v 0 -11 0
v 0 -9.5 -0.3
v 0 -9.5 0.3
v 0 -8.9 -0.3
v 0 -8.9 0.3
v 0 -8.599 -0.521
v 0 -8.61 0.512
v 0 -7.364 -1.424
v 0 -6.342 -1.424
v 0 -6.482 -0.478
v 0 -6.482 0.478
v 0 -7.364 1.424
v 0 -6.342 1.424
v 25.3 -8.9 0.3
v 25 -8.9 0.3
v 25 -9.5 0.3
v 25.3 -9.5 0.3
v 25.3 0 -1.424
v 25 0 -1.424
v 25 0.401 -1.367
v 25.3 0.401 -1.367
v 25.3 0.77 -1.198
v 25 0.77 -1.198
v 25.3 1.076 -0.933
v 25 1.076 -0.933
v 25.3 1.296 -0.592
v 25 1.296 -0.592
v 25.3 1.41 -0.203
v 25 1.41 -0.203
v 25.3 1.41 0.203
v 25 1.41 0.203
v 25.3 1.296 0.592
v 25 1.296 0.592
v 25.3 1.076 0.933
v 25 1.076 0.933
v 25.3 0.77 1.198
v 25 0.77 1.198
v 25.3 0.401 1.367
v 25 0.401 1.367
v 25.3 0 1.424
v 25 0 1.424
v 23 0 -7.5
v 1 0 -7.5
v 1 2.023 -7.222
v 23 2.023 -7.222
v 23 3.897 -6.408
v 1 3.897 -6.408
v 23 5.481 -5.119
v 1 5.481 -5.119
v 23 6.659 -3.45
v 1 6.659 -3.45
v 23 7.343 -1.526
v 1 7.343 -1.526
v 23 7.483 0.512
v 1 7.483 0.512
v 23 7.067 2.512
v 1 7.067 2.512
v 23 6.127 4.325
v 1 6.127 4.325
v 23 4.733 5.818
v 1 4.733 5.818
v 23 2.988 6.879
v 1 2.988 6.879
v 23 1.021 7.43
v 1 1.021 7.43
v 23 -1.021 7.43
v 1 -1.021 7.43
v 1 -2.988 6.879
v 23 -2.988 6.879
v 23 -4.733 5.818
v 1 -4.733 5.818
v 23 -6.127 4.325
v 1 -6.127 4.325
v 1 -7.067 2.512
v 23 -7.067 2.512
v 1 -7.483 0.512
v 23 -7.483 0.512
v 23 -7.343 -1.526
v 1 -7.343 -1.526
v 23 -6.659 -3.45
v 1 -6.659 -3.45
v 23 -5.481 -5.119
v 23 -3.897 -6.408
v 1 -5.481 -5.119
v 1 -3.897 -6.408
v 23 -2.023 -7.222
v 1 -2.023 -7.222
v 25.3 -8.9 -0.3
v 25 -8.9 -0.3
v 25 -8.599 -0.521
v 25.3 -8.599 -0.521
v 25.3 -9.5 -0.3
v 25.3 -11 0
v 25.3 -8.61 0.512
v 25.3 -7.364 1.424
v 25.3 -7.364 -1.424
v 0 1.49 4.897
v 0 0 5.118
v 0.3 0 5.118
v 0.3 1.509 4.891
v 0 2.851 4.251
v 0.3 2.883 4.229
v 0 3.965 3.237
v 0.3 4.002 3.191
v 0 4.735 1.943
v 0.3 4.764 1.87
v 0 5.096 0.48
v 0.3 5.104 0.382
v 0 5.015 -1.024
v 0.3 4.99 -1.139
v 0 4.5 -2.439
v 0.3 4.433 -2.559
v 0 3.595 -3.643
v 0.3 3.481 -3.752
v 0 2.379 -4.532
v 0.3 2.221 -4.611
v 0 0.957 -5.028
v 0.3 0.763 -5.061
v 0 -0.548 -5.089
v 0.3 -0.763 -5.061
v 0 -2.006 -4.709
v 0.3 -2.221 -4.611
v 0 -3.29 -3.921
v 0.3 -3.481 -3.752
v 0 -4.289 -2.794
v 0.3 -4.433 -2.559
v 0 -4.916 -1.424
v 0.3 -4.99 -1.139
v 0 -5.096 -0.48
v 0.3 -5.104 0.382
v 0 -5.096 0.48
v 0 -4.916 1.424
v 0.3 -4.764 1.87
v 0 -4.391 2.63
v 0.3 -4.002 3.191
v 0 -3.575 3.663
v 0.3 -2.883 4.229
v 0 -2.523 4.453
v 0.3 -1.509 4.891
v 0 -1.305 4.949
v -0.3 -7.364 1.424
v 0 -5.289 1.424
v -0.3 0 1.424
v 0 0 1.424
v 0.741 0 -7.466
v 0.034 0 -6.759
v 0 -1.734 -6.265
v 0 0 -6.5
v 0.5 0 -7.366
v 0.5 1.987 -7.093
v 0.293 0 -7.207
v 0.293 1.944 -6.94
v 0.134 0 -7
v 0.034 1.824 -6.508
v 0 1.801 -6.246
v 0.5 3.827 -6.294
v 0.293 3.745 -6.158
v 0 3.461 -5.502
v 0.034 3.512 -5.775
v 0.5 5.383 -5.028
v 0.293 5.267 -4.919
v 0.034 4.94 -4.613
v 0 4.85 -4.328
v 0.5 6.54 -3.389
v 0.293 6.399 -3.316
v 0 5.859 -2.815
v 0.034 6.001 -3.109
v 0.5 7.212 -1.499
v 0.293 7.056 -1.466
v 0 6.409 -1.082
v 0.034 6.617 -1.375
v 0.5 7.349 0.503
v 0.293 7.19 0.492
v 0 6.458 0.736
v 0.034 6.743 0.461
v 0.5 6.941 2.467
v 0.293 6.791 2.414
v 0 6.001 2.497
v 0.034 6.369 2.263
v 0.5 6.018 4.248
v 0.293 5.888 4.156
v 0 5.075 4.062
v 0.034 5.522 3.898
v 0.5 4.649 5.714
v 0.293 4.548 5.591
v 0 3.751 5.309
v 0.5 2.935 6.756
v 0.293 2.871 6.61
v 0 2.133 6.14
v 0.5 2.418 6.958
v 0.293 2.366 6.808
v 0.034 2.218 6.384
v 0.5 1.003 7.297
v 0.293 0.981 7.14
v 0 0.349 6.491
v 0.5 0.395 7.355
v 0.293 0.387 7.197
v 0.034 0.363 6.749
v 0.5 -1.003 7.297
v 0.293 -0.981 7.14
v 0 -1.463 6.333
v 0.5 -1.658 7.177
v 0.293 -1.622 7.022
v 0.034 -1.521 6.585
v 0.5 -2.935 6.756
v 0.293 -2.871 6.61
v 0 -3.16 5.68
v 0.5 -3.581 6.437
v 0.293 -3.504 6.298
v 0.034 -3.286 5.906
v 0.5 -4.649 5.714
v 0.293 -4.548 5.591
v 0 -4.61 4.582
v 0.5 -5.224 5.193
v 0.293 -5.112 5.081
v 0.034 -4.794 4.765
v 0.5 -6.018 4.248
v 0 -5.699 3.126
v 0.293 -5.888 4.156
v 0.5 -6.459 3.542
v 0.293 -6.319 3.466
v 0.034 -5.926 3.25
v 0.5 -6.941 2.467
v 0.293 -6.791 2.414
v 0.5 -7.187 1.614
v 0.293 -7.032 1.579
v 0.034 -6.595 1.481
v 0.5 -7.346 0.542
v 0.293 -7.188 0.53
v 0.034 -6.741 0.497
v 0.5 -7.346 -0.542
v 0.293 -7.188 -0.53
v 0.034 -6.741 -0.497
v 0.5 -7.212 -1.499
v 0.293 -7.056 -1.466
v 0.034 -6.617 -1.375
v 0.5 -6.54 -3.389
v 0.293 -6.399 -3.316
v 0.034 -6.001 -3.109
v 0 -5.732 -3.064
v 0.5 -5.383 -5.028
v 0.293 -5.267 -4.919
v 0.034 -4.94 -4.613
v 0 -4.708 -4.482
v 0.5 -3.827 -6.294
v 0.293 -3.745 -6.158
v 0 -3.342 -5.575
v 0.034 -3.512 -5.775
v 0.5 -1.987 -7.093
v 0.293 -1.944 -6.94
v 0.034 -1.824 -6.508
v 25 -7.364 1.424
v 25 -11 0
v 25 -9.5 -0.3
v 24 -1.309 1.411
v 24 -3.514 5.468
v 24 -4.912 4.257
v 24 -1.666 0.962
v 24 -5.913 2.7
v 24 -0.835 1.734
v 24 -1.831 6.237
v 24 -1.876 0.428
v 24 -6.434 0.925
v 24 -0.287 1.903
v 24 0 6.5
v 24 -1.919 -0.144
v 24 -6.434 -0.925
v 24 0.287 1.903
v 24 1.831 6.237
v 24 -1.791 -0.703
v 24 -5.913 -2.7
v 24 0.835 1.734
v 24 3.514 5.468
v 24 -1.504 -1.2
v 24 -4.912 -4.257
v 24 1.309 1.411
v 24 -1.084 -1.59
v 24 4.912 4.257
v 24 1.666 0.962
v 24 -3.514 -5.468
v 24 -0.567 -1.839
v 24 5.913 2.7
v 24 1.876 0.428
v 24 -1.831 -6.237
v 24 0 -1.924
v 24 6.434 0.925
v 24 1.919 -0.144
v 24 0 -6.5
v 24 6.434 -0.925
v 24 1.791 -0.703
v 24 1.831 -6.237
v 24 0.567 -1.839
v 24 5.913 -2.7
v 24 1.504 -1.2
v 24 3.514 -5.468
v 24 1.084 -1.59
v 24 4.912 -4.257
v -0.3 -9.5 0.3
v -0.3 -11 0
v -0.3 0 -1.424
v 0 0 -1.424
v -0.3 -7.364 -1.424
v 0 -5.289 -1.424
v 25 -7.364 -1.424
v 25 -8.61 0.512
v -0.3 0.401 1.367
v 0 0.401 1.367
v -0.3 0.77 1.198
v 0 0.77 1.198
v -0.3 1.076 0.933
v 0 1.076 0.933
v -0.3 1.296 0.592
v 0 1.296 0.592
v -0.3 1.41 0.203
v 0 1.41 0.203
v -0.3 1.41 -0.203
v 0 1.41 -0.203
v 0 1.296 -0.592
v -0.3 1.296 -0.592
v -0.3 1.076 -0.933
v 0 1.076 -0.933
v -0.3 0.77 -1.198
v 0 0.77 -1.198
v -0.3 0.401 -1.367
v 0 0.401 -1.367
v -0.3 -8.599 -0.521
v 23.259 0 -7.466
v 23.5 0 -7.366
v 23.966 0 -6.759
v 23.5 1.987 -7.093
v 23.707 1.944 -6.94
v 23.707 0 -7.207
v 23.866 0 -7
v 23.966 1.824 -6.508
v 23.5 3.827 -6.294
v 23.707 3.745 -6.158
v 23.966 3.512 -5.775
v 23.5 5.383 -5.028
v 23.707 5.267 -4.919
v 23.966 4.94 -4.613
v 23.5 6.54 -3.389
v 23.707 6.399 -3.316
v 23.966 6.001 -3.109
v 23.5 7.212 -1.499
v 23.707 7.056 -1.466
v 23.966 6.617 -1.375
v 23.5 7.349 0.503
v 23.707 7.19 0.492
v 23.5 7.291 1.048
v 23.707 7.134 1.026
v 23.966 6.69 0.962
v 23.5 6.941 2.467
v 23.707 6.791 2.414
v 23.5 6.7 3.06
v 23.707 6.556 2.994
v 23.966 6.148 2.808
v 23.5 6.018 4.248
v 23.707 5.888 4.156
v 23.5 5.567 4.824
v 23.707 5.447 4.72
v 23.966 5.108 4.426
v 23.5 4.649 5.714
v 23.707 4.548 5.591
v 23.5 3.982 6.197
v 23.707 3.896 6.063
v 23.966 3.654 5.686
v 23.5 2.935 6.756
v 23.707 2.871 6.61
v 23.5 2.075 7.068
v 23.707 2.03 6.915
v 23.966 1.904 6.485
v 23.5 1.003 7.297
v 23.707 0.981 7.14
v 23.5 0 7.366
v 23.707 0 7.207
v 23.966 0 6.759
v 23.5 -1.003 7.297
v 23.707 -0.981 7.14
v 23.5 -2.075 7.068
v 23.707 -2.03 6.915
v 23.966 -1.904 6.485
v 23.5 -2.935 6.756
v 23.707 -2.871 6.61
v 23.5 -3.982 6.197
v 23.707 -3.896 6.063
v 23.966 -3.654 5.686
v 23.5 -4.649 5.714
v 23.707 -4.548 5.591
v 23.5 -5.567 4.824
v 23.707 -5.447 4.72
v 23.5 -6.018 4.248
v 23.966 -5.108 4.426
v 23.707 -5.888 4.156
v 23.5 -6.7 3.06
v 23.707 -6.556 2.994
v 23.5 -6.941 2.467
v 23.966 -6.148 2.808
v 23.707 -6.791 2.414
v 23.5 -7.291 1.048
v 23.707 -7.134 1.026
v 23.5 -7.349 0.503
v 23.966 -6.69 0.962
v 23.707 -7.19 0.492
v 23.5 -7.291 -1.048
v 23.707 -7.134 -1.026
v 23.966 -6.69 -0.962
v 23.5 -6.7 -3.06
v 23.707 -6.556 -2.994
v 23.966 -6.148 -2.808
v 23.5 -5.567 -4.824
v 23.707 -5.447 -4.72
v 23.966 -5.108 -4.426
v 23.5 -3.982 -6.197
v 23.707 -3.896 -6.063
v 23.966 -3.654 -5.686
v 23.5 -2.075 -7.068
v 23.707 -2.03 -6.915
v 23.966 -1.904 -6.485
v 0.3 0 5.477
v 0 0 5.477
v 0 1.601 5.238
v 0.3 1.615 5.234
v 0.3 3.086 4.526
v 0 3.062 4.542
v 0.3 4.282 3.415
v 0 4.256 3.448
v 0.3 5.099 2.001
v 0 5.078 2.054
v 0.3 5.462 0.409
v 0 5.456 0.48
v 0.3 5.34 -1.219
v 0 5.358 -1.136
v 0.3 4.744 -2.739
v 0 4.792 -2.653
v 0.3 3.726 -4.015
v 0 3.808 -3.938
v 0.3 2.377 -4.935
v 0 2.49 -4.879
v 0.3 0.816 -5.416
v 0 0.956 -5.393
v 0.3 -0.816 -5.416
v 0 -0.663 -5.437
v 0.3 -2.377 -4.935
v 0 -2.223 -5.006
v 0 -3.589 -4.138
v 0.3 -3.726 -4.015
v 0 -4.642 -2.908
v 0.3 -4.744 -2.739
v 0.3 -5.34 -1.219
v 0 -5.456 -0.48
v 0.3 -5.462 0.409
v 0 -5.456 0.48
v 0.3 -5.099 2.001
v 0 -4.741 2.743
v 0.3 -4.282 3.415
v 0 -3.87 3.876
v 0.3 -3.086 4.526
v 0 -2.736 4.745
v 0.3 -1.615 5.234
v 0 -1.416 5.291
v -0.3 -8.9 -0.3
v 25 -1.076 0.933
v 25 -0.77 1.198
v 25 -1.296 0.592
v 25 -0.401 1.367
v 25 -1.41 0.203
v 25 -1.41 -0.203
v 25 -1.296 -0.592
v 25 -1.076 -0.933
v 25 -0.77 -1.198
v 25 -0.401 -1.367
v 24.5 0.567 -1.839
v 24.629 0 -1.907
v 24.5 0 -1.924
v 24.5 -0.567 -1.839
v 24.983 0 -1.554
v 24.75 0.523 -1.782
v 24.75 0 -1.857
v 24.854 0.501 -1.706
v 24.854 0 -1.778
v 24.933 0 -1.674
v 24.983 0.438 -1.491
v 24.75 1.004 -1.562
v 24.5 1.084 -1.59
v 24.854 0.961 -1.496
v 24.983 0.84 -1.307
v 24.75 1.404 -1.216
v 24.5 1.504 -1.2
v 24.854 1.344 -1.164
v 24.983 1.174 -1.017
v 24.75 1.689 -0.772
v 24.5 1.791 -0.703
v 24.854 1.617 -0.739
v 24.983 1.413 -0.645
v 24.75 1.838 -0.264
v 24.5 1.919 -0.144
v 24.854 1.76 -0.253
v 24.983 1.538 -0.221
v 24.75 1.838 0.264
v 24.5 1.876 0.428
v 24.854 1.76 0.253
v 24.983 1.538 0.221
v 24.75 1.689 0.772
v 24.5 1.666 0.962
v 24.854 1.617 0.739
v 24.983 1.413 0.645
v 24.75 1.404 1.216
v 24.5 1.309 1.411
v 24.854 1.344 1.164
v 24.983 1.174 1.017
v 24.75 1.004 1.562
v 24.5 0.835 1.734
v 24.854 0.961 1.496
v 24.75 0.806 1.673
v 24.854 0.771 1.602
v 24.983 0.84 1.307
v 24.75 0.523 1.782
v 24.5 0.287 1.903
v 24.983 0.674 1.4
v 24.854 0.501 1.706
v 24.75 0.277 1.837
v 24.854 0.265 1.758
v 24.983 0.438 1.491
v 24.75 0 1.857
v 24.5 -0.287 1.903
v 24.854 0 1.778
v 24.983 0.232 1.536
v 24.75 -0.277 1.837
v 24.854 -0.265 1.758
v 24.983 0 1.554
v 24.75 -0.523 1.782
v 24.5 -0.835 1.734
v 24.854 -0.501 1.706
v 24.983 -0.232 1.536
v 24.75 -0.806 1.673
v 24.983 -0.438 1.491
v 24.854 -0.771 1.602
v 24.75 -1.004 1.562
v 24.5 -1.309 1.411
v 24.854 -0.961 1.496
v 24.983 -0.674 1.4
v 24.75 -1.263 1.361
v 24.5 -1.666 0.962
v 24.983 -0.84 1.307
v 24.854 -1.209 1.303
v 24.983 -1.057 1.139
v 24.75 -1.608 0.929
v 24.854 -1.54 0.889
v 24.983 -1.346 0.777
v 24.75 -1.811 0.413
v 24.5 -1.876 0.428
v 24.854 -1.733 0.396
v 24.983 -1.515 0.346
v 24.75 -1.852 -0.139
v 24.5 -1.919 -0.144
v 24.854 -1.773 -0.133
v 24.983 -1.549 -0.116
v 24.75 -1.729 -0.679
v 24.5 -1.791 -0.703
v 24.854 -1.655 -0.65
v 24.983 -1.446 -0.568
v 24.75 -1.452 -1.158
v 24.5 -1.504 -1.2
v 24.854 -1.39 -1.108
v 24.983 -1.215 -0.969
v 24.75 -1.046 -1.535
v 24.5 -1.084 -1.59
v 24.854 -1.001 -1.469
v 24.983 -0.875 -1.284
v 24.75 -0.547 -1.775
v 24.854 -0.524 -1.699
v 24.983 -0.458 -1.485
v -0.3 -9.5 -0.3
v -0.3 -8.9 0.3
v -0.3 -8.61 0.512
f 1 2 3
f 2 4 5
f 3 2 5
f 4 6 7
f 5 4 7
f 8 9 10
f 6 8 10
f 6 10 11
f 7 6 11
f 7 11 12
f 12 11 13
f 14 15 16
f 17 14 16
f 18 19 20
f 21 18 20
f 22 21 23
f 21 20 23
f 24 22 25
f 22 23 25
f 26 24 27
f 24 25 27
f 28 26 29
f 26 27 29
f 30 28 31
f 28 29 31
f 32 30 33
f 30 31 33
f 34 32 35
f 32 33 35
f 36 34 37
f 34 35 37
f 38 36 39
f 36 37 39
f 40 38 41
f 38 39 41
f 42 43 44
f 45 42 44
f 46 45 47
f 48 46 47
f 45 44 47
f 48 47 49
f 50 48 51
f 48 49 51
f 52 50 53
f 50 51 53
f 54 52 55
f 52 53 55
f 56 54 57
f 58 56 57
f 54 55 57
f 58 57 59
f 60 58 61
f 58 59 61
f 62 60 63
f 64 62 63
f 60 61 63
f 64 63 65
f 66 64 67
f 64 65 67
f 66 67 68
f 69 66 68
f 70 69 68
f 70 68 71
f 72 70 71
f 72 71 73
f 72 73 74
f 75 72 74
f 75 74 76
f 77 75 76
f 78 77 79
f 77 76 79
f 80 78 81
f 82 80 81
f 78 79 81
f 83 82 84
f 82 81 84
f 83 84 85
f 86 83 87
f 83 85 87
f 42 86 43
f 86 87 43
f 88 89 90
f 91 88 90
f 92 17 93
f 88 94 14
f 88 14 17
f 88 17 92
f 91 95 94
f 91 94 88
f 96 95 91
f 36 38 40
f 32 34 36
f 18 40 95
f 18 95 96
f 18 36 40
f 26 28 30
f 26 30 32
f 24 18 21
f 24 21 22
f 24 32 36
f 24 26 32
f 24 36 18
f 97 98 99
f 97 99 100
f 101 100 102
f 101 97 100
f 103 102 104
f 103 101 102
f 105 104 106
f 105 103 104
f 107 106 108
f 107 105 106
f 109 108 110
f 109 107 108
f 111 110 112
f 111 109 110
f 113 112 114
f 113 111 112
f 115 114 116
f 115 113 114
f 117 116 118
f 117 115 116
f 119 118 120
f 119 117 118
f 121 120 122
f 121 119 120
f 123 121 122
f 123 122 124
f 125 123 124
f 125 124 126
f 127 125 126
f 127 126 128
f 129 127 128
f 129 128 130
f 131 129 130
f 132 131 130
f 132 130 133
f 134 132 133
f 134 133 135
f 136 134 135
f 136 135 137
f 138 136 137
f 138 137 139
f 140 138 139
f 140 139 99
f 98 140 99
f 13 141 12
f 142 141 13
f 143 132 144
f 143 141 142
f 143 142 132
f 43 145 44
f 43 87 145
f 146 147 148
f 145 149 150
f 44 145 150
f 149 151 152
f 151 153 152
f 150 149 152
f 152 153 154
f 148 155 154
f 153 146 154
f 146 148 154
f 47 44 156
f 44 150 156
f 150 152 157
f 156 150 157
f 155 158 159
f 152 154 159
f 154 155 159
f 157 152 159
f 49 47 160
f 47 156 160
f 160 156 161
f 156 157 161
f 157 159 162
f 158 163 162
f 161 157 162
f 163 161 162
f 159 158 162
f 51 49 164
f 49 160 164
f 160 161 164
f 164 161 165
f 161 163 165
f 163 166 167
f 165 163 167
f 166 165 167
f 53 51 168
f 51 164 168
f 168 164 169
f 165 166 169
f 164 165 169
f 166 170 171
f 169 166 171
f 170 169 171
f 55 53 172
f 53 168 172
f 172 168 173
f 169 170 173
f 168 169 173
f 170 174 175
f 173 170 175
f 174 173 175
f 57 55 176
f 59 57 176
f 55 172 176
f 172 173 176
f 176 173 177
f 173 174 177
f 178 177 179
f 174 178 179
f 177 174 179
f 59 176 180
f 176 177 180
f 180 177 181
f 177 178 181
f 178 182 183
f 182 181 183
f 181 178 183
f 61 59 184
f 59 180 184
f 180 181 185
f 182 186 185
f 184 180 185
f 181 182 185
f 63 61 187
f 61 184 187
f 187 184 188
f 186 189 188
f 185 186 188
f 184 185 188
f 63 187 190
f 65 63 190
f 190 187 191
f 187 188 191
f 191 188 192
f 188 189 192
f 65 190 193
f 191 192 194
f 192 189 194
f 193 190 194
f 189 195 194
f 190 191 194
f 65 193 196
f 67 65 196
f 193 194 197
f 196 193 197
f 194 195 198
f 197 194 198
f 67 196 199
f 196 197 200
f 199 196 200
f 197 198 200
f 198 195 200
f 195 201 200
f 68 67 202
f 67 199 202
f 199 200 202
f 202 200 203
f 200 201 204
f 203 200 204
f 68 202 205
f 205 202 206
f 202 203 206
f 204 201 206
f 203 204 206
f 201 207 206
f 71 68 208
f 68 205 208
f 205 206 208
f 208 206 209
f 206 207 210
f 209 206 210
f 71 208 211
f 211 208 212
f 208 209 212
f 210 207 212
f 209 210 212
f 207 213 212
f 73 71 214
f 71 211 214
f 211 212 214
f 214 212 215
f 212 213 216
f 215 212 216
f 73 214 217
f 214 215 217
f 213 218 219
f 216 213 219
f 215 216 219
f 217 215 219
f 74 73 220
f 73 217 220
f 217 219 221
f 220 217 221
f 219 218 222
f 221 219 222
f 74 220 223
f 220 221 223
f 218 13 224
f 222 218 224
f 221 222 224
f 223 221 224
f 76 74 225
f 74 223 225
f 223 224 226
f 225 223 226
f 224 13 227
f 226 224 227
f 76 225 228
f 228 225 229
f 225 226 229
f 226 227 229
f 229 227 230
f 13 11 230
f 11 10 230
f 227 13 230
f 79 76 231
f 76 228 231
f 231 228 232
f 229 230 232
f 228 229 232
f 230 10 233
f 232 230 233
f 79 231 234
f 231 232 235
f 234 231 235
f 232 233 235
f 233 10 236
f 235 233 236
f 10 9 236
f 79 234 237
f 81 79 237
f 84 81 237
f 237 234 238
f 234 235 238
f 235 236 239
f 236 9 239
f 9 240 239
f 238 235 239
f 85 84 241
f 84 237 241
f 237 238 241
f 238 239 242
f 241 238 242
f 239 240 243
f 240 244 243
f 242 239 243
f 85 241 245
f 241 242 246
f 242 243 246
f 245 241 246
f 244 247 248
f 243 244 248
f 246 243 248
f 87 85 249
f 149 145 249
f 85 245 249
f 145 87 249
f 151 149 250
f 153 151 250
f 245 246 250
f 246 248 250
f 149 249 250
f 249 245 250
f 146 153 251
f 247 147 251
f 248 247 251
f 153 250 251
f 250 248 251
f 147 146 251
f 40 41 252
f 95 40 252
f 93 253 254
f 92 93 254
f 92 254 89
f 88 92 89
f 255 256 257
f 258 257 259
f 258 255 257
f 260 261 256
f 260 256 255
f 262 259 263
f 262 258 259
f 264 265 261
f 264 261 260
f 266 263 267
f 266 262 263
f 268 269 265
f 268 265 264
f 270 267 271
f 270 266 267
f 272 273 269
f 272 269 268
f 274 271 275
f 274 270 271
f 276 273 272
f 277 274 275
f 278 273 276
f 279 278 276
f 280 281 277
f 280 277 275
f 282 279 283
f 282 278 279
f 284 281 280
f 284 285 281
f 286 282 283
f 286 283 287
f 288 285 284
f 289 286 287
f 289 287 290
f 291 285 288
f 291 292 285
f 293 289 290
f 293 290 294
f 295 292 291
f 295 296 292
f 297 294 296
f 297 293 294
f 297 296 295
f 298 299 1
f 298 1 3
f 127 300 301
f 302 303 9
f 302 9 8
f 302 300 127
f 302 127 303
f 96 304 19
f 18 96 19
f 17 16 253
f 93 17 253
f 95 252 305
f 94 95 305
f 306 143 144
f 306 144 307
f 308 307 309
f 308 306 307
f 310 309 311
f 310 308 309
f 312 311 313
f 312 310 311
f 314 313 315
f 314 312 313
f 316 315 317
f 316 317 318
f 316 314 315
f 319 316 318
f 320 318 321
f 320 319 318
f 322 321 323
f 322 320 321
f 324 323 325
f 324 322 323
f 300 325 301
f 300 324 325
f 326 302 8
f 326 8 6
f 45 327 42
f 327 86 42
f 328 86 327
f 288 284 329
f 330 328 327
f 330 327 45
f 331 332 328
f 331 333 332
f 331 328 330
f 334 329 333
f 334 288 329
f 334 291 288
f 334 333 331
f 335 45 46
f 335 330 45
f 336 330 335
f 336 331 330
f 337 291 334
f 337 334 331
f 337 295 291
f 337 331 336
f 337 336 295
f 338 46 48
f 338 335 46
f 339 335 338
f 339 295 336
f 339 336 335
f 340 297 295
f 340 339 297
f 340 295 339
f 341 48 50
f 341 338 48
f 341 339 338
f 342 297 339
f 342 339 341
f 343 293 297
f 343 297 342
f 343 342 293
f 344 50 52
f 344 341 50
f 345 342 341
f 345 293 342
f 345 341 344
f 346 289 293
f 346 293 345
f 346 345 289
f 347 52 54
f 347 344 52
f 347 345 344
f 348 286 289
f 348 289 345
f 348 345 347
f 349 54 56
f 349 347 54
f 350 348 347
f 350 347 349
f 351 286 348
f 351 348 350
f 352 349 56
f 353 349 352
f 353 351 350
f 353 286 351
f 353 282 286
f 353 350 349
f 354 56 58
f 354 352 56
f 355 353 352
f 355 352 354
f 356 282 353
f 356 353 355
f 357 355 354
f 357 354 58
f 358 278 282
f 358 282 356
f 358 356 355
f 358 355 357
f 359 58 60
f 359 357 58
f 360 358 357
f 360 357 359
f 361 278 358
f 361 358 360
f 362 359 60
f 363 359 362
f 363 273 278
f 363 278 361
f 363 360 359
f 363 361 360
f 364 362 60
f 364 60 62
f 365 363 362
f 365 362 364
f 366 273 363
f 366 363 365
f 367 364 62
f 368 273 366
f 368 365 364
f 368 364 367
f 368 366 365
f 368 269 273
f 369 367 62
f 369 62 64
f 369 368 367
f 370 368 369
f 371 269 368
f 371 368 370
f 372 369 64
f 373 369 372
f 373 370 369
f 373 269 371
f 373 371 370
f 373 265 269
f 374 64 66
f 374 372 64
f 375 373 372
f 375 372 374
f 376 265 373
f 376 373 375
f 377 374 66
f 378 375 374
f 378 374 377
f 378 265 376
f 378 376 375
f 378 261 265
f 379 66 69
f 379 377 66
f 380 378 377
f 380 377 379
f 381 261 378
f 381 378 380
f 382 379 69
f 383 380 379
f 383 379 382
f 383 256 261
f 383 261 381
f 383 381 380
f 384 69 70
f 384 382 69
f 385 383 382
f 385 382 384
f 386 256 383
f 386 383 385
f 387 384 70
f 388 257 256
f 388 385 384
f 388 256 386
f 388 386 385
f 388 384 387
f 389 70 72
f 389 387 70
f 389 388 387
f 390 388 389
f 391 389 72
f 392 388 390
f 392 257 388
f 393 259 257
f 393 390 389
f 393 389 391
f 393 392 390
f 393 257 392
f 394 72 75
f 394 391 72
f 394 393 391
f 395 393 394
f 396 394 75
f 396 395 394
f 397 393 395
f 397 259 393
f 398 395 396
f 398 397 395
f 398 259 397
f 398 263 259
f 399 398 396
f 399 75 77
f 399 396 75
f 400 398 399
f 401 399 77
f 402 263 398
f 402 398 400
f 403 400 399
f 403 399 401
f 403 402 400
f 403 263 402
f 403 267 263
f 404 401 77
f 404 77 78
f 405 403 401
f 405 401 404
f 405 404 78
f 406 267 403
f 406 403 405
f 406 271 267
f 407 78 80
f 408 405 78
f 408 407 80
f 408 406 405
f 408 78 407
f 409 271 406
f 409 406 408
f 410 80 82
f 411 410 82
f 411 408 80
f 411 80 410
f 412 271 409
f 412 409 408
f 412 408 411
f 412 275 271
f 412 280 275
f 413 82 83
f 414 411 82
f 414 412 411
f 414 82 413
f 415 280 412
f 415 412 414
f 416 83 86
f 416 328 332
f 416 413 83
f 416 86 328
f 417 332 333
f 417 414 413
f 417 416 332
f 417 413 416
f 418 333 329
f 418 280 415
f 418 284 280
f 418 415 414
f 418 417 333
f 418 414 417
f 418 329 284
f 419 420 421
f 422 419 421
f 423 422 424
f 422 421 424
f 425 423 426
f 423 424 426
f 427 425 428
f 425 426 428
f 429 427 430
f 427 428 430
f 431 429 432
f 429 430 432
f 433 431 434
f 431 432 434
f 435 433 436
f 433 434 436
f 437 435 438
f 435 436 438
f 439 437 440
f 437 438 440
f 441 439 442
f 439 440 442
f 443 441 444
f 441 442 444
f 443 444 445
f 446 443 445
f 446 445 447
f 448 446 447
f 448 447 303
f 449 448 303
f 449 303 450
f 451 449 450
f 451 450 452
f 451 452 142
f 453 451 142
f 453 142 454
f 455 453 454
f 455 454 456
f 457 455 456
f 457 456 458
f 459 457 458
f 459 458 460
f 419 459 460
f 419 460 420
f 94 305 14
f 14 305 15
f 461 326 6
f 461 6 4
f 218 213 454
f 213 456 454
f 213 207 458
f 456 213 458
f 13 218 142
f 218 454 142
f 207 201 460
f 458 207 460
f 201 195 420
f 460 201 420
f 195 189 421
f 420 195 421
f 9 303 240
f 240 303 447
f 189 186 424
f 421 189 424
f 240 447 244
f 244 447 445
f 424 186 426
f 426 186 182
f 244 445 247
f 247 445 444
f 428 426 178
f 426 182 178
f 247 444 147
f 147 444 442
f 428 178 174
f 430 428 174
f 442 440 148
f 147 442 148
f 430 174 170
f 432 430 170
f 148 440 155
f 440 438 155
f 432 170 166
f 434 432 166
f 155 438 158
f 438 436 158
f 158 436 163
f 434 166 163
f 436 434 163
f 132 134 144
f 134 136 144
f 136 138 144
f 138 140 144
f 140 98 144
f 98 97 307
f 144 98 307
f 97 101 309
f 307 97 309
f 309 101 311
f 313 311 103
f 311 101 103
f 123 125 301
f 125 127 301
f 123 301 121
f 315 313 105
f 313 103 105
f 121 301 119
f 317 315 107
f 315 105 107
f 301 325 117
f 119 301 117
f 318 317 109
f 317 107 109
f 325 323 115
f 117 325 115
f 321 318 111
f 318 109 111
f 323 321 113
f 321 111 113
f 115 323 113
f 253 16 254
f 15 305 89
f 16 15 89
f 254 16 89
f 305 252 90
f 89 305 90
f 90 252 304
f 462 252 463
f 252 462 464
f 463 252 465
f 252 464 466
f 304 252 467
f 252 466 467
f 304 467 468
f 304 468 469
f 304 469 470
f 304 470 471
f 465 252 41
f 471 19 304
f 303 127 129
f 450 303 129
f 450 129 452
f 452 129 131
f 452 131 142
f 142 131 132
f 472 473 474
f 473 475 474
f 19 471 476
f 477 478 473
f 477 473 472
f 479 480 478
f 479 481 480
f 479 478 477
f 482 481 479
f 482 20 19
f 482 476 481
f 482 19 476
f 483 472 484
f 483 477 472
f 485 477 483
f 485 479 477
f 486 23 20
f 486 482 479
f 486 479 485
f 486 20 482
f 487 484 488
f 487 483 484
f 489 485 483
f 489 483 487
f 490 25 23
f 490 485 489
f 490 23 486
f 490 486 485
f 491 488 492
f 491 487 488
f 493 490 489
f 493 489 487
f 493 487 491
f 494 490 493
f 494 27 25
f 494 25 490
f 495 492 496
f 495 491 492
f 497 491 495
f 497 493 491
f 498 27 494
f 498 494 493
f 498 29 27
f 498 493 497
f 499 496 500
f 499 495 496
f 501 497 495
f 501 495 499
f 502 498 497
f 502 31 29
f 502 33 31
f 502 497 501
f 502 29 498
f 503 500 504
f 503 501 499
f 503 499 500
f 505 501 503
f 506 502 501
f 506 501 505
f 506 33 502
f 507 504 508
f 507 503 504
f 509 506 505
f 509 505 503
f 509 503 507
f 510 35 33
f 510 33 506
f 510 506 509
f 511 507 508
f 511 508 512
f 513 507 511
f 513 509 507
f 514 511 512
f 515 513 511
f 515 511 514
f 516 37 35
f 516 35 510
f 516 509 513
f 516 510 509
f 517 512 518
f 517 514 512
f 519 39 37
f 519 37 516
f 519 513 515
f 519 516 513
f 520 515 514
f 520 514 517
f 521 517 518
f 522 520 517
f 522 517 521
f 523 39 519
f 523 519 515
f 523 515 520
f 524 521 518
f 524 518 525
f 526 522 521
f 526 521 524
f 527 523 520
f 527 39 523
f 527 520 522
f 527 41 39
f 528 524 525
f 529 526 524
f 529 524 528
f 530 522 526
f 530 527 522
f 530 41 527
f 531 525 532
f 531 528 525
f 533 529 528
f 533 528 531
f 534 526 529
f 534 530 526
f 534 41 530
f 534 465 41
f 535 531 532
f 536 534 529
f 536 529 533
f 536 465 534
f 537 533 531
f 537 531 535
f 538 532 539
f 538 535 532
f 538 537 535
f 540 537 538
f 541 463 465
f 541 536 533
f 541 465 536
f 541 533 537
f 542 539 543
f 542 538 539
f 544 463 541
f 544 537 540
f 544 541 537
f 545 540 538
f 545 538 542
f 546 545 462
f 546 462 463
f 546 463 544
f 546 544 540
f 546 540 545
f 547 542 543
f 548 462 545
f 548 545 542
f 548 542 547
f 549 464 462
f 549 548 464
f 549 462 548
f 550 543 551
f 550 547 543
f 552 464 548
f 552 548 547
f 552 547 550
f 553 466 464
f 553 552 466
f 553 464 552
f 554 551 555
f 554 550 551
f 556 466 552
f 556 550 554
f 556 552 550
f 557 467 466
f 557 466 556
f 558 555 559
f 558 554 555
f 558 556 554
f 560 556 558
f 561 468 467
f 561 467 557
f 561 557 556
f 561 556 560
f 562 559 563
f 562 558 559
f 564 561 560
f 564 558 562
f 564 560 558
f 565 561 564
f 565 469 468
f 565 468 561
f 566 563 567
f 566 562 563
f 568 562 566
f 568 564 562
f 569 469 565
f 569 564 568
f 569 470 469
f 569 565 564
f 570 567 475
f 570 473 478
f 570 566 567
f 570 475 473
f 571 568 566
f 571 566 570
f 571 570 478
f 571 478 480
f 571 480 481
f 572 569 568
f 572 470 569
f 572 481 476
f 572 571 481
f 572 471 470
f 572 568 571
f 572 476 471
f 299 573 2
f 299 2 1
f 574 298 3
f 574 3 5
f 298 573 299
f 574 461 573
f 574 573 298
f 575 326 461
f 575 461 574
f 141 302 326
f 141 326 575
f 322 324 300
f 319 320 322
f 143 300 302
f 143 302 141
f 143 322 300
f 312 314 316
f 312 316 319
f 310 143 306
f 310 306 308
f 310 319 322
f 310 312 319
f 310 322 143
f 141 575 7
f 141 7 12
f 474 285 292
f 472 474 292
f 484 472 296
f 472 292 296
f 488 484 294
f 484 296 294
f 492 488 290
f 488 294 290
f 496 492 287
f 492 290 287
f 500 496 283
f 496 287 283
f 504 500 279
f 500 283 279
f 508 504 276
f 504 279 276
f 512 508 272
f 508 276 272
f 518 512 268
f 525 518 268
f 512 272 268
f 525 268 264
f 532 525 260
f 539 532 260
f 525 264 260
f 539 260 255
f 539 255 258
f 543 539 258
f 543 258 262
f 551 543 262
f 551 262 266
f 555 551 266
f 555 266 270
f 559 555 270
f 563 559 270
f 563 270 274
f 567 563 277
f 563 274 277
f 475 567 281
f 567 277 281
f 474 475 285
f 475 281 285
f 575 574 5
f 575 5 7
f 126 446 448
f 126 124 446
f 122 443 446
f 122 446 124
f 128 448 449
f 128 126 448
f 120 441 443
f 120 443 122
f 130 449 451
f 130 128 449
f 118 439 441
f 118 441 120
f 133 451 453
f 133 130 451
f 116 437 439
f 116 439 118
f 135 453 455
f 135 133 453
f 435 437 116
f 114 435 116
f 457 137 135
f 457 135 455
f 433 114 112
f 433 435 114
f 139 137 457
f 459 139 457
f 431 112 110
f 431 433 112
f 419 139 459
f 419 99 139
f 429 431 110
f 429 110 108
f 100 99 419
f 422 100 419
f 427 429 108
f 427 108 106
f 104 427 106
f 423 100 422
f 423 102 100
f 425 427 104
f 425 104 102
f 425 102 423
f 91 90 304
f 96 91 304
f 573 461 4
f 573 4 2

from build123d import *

# Parameters (mm, degrees)
SKETCH1_R           = 7.5
BOSS_EXTRUDE1_DEPTH = 24
FILLET1_R           = 1
SKETCH2_R           = 1.924270806
BOSS_EXTRUDE2_DEPTH = 1
FILLET2_R           = 0.5
SKETCH3_R           = 5.477488552
SKETCH3_R_2         = 5.118293918
CUT_EXTRUDE1_DEPTH  = 0.3
BOSS_EXTRUDE3_DEPTH = 0.3
BOSS_EXTRUDE4_START = 0.3
BOSS_EXTRUDE4_DEPTH = 0.3


with BuildPart() as part:
    # Sketch1 → Boss-Extrude1 (new body)
    with BuildSketch(Plane(origin=(0, 0, 0), x_dir=(0, 0, -1), z_dir=(1, 0, 0))):
        Circle(SKETCH1_R)
    extrude(amount=BOSS_EXTRUDE1_DEPTH)

    # Fillet1
    fillet1_edges = [part.edges().sort_by_distance(p)[0] for p in [
        (0, 0, 7.5),
        (24, 0, 7.5),
    ]]
    fillet(fillet1_edges, radius=FILLET1_R)

    # Sketch2 → Boss-Extrude2 (add)
    with BuildSketch(Plane(origin=(24, 0, 0), x_dir=(0, 0, -1), z_dir=(1, 0, 0))):
        Circle(SKETCH2_R)
    extrude(amount=BOSS_EXTRUDE2_DEPTH)

    # Fillet2
    fillet2_edges = [part.edges().sort_by_distance(p)[0] for p in [
        (25, 0, 1.924270806),
    ]]
    fillet(fillet2_edges, radius=FILLET2_R)

    # Sketch3 → Cut-Extrude1 (cut)
    with BuildSketch(Plane.ZY):
        Circle(SKETCH3_R)
        Circle(SKETCH3_R_2, mode=Mode.SUBTRACT)
    extrude(amount=-CUT_EXTRUDE1_DEPTH, mode=Mode.SUBTRACT)

    # Sketch4 → Boss-Extrude3 (add)
    with BuildSketch(Plane(origin=(25, 0, 0), x_dir=(0, 0, -1), z_dir=(1, 0, 0))):
        with BuildLine():
            Line((-1.424270806, 0), (-1.424270806, -7.363521757))
            Line((-1.424270806, -7.363521757), (-0.511928366, -8.610369315))
            Line((-0.511928366, -8.610369315), (-0.3, -8.9))
            Line((-0.3, -8.9), (-0.3, -9.5))
            Line((-0.3, -9.5), (0, -11))
            Line((0, -11), (0.3, -9.5))
            Line((0.3, -9.5), (0.3, -8.9))
            Line((0.3, -8.9), (0.520522804, -8.598623776))
            Line((0.520522804, -8.598623776), (1.424270806, -7.363521757))
            Line((1.424270806, -7.363521757), (1.424270806, 0))
            ThreePointArc((1.424270806, 0), (0, 1.424270806), (-1.424270806, 0))
        make_face()
    extrude(amount=BOSS_EXTRUDE3_DEPTH)

    # Sketch5 → Boss-Extrude4 (add)
    with BuildSketch(Plane.ZY.offset(BOSS_EXTRUDE4_START)):
        with BuildLine():
            Line((-0.3, -8.9), (-0.3, -9.5))
            Line((-0.3, -9.5), (0, -11))
            Line((0, -11), (0.3, -9.5))
            Line((0.3, -9.5), (0.3, -8.9))
            Line((0.3, -8.9), (0.511928366, -8.610369315))
            Line((0.511928366, -8.610369315), (1.424270806, -7.363521757))
            Line((1.424270806, -7.363521757), (1.424270806, 0))
            ThreePointArc((1.424270806, 0), (0, 1.424270806), (-1.424270806, 0))
            Line((-1.424270806, 0), (-1.424270806, -7.363521757))
            Line((-1.424270806, -7.363521757), (-0.520522804, -8.598623776))
            Line((-0.520522804, -8.598623776), (-0.3, -8.9))
        make_face()
    extrude(amount=-BOSS_EXTRUDE4_DEPTH)


solid = part.part
